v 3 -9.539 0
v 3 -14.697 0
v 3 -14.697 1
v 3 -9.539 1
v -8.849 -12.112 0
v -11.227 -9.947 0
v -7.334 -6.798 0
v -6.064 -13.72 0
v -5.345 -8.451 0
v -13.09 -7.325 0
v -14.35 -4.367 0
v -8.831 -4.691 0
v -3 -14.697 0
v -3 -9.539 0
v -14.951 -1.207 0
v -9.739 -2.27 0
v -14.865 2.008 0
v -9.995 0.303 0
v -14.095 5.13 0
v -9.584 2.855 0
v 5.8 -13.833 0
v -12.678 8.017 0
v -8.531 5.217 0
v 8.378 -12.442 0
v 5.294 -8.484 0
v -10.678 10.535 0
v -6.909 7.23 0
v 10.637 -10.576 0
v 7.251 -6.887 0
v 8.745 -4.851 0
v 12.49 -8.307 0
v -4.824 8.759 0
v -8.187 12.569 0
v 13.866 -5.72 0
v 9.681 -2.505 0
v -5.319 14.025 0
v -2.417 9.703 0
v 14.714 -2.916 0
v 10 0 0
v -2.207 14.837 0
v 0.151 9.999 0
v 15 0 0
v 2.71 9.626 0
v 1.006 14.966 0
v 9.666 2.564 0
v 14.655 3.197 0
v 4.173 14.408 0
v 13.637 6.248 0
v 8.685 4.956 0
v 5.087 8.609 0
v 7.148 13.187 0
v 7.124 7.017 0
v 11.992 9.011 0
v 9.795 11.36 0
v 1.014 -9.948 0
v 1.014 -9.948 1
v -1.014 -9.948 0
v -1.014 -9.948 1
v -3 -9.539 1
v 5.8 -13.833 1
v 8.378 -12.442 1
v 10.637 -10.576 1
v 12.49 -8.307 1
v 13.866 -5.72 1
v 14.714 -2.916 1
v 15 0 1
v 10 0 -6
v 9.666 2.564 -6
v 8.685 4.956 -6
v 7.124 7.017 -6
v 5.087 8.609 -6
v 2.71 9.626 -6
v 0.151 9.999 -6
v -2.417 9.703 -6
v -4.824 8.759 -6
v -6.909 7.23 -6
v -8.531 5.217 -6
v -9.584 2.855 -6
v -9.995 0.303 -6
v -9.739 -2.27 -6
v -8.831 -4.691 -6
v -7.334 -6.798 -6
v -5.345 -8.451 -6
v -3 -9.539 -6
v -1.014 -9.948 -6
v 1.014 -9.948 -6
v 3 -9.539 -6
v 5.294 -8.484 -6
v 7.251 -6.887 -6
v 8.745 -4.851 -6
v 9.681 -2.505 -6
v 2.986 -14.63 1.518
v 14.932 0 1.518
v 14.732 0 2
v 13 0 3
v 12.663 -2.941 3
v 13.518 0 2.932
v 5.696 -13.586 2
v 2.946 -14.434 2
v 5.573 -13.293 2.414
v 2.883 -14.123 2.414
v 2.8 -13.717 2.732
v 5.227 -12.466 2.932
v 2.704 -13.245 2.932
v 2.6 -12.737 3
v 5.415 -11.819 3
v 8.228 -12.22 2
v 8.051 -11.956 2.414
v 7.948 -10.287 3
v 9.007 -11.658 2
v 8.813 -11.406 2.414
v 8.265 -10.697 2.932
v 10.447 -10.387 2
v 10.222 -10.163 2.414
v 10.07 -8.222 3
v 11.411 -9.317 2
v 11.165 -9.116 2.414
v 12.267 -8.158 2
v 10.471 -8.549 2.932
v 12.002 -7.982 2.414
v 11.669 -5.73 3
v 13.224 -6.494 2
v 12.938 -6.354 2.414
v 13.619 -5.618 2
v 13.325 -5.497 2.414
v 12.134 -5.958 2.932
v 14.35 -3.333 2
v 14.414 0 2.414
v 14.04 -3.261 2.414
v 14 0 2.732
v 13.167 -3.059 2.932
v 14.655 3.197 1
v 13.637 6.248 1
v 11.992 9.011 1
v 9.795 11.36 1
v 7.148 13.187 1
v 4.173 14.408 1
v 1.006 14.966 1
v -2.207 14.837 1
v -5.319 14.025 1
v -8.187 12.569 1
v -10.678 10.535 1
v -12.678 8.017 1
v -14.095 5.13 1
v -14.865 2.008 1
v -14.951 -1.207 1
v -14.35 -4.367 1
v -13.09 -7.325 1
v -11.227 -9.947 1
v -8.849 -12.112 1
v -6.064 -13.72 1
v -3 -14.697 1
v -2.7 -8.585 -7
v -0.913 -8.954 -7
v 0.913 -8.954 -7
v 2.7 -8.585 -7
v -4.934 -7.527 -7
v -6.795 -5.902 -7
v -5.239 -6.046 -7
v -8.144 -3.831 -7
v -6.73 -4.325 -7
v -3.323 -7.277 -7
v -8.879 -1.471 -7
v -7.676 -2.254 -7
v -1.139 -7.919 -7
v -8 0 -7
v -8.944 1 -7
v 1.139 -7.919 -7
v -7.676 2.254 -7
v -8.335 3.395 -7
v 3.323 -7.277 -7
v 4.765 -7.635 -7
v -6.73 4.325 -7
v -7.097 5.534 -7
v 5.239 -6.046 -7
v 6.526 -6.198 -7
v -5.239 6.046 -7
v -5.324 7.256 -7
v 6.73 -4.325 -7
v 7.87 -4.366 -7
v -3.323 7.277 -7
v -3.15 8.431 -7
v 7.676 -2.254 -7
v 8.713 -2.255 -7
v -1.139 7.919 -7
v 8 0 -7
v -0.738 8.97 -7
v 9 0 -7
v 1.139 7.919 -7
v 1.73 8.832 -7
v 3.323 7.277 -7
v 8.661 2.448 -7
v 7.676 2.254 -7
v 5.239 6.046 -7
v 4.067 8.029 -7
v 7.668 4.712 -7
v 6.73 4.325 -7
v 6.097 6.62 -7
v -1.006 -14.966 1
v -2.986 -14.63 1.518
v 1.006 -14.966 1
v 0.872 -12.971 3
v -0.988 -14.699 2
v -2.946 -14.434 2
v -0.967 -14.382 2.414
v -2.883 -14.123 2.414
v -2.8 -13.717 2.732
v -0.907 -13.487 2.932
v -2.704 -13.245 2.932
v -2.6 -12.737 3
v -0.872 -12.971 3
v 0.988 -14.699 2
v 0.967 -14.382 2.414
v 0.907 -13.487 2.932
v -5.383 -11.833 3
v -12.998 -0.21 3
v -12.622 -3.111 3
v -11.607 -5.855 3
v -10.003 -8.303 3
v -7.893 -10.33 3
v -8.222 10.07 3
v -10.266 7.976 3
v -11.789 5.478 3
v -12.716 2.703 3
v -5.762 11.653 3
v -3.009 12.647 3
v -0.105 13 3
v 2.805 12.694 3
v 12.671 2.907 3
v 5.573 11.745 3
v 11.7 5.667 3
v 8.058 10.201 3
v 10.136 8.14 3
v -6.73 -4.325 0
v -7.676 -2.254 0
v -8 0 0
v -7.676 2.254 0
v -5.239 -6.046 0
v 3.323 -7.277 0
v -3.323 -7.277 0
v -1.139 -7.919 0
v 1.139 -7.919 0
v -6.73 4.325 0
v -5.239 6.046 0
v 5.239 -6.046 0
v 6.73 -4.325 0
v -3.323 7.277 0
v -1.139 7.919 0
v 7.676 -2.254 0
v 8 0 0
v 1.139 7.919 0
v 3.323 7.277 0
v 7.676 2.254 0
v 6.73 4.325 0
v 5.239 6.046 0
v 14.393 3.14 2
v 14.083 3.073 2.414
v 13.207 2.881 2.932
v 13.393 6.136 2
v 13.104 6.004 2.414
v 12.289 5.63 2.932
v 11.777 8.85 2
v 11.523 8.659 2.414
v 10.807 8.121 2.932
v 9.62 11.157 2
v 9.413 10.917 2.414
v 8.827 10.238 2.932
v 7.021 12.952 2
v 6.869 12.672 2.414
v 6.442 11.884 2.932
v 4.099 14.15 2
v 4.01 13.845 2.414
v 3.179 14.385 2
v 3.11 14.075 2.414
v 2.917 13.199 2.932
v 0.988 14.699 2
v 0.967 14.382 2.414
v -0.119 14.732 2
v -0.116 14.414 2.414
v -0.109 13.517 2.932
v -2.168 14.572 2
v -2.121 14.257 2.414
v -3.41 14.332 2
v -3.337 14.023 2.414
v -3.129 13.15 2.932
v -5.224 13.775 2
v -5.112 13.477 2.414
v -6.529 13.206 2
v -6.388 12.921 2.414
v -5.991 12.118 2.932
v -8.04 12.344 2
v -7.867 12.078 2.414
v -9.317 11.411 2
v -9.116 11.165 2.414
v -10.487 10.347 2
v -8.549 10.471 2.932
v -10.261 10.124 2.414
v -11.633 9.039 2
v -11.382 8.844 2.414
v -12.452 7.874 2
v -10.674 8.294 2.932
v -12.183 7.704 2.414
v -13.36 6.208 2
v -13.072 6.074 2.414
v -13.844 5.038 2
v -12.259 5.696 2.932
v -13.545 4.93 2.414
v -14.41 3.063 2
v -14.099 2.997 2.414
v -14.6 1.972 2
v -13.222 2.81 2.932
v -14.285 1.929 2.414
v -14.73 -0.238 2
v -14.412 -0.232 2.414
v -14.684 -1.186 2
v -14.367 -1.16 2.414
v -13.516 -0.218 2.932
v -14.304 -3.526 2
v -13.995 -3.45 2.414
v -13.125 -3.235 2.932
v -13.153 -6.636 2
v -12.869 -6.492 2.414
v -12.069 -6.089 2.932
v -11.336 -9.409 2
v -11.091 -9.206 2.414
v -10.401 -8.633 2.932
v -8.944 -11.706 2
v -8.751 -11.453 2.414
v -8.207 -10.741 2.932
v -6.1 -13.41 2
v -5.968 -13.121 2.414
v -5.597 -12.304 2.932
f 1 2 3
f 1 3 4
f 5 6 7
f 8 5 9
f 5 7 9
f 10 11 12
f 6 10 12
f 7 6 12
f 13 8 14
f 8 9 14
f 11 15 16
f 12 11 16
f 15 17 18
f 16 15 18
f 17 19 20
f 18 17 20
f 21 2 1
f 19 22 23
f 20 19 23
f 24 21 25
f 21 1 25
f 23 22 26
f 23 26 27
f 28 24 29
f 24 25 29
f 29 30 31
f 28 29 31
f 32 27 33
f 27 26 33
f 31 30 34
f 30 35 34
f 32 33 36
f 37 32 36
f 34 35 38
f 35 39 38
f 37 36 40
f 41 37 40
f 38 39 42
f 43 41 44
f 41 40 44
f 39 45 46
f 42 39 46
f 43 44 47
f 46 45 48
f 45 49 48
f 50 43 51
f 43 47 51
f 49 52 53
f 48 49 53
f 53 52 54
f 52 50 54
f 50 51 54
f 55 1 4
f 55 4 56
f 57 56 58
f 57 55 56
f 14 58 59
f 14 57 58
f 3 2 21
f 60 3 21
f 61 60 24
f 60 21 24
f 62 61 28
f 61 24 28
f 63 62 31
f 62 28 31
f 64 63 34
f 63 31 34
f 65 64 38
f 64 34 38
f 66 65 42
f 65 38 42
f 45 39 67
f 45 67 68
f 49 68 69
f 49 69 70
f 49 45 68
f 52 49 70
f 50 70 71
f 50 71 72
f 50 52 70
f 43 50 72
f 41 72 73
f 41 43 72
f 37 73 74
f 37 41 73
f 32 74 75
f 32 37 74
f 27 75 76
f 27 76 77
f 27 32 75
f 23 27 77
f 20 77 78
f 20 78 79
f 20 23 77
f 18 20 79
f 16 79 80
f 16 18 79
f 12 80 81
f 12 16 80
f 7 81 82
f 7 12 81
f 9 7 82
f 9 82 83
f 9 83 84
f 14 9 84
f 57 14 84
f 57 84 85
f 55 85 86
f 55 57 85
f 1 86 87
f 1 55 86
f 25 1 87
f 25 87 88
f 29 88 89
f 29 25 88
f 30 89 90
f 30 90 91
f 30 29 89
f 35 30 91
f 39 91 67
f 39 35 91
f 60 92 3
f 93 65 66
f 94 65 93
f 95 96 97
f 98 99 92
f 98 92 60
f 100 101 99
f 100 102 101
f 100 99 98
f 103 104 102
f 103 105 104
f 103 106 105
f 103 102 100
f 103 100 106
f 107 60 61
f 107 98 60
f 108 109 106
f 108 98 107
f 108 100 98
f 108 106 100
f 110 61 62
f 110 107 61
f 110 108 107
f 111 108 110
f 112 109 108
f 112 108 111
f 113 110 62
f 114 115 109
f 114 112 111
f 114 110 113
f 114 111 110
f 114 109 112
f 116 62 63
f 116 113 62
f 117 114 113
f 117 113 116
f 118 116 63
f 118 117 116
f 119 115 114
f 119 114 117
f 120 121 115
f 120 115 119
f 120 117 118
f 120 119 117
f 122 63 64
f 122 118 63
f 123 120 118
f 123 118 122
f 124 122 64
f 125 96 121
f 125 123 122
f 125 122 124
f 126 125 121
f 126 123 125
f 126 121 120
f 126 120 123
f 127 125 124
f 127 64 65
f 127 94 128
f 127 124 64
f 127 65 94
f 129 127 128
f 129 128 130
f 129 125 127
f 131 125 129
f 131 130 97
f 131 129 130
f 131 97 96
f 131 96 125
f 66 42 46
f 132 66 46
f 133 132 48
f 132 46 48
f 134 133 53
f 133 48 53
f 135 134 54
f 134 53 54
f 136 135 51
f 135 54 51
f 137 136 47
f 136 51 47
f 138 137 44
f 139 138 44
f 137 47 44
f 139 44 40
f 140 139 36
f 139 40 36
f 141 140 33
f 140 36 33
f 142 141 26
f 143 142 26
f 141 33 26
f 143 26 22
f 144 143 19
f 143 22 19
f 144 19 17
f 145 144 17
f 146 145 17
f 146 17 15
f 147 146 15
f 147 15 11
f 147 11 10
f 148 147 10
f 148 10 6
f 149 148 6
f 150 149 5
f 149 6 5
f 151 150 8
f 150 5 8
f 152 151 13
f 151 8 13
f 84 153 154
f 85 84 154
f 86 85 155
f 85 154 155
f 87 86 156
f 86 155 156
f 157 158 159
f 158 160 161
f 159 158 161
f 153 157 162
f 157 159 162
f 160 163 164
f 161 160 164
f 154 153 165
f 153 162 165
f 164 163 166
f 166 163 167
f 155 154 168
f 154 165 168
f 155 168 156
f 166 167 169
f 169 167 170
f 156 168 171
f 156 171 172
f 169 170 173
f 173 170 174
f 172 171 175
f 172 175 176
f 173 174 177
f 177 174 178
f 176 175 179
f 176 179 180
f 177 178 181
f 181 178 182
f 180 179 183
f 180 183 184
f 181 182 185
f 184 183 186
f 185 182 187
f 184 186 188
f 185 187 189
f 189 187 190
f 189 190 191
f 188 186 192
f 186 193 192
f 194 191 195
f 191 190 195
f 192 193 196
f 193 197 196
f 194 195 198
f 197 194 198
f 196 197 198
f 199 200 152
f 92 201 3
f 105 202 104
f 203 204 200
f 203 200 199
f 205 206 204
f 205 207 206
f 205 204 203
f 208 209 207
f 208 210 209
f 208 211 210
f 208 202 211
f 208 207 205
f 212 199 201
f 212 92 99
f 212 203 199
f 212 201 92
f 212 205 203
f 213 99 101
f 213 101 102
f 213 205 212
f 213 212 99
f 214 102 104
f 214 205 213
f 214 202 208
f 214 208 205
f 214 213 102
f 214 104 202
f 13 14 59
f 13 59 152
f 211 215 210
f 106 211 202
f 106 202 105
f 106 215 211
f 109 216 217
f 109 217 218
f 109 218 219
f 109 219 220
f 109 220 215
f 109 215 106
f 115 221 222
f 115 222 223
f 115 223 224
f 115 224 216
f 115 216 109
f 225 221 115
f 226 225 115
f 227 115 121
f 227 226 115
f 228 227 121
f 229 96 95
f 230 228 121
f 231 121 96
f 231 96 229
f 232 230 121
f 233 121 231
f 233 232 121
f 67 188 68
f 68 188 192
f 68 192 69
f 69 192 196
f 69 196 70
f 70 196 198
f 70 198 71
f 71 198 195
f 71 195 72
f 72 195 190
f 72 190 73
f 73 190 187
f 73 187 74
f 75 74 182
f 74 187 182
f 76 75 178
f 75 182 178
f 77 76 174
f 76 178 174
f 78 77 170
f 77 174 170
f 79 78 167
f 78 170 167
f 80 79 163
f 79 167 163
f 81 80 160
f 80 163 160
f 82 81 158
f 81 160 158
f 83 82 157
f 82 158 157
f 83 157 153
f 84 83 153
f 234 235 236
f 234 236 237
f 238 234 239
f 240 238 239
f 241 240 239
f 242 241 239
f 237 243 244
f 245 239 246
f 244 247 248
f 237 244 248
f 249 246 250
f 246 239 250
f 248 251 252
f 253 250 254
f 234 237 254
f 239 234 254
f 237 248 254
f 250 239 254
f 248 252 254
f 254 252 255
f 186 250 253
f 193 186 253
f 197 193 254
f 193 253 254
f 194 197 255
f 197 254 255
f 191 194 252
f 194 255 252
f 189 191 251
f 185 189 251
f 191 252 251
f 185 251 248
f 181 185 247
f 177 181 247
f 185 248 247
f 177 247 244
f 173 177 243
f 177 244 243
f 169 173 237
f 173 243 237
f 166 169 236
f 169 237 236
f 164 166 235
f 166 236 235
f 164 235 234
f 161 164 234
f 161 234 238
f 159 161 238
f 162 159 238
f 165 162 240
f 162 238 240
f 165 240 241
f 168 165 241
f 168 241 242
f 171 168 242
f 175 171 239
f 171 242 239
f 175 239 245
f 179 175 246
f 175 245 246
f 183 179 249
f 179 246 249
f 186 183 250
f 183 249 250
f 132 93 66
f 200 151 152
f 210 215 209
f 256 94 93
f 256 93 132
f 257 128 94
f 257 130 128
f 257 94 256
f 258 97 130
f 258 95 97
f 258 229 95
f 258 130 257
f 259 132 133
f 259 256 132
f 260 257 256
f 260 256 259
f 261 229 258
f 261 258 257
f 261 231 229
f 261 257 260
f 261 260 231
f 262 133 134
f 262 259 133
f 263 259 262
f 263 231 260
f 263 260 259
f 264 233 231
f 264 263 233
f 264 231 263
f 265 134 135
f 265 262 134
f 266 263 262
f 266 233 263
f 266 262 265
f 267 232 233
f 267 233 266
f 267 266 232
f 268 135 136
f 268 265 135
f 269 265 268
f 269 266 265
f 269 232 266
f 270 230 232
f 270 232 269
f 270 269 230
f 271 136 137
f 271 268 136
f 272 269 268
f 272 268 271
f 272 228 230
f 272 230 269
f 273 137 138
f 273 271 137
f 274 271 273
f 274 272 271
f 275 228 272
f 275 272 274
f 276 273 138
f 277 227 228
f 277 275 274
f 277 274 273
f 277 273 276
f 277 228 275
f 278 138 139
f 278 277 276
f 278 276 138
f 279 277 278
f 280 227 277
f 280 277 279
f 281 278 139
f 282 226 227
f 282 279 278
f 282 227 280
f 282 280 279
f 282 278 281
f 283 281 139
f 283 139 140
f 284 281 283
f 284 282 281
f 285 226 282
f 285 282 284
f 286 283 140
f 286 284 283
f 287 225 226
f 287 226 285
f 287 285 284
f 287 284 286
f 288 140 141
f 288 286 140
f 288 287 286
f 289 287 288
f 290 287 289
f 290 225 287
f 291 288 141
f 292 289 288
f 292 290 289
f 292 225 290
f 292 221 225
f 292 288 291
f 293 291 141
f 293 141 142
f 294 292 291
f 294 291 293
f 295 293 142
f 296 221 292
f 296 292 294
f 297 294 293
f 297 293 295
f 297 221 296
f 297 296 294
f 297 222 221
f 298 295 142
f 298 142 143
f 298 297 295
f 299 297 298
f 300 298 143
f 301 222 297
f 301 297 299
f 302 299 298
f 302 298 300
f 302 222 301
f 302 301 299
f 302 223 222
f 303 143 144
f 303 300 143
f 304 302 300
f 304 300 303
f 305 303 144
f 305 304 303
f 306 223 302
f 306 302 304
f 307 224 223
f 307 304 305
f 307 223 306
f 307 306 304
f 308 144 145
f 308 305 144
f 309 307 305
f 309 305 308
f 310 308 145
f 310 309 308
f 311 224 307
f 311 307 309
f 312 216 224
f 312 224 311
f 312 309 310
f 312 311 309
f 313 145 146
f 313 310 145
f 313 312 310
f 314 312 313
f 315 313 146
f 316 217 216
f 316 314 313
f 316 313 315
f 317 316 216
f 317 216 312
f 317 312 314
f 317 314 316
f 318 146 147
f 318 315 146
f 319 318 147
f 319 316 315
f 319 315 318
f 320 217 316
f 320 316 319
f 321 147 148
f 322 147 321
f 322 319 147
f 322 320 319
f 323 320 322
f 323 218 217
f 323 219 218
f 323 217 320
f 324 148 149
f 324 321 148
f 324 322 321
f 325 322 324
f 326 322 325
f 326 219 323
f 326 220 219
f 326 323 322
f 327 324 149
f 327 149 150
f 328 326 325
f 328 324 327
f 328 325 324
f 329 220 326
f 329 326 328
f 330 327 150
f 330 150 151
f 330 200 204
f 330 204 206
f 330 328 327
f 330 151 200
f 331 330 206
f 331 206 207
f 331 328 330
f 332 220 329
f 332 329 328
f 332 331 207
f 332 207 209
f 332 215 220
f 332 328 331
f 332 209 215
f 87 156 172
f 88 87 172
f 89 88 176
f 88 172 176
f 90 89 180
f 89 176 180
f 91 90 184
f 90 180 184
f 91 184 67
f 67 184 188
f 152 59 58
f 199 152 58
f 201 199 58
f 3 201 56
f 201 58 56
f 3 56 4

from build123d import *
from build123d import SkipClean  # not in build123d's __all__

# Parameters (mm, degrees)
F0_R     = 8
F1_DEPTH = 3
F2_DEPTH = 7
F3_R     = 2
F4_SIZE  = 1
F5_DEPTH = 1


with BuildPart() as f1:
    # F0 (on Top) → F1 (new body)
    with BuildSketch(Plane.XY):
        with BuildLine():
            ThreePointArc((-3, -9.5393920142), (-5.9160797831, 8.0622577483), (10, 0))
            ThreePointArc((10, 0), (8.0622577483, -5.9160797831), (3, -9.5393920142))
            Line((3, -9.5393920142), (3, -14.6969384567))
            ThreePointArc((3, -14.6969384567), (11.6189500386, -9.4868329805), (15, 0))
            ThreePointArc((15, 0), (-9.4868329805, 11.6189500386), (-3, -14.6969384567))
            Line((-3, -14.6969384567), (-3, -9.5393920142))
        make_face()
        with BuildLine():
            ThreePointArc((3, -9.5393920142), (0, -10), (-3, -9.5393920142))
            Line((-3, -9.5393920142), (-3, -14.6969384567))
            ThreePointArc((-3, -14.6969384567), (0, -15), (3, -14.6969384567))
            Line((3, -14.6969384567), (3, -9.5393920142))
        make_face()
        with BuildLine():
            ThreePointArc((3, -9.5393920142), (8.0622577483, -5.9160797831), (10, 0))
            ThreePointArc((10, 0), (-5.9160797831, 8.0622577483), (-3, -9.5393920142))
            ThreePointArc((-3, -9.5393920142), (0, -10), (3, -9.5393920142))
        make_face()
        Circle(F0_R, mode=Mode.SUBTRACT)
        Circle(F0_R)
    extrude(amount=F1_DEPTH)

    # F0 (on Top) → F2 (join)
    with BuildSketch(Plane.XY):
        with BuildLine():
            ThreePointArc((3, -9.5393920142), (8.0622577483, -5.9160797831), (10, 0))
            ThreePointArc((10, 0), (-5.9160797831, 8.0622577483), (-3, -9.5393920142))
            ThreePointArc((-3, -9.5393920142), (0, -10), (3, -9.5393920142))
        make_face()
        Circle(F0_R, mode=Mode.SUBTRACT)
    extrude(amount=-F2_DEPTH)

    # F3
    f3_edges = [f1.edges().sort_by_distance(p)[0] for p in [
        (-15, 0, 3),
    ]]
    fillet(f3_edges, radius=F3_R)

    # F4
    f4_edges = [f1.edges().sort_by_distance(p)[0] for p in [
        (3, 9.539392, -7),
    ]]
    chamfer(f4_edges, length=F4_SIZE)

    # F0 (on Top) → F5 (cut)
    with BuildSketch(Plane.XY):
        with BuildLine():
            ThreePointArc((3, -9.5393920142), (0, -10), (-3, -9.5393920142))
            Line((-3, -9.5393920142), (-3, -14.6969384567))
            ThreePointArc((-3, -14.6969384567), (0, -15), (3, -14.6969384567))
            Line((3, -14.6969384567), (3, -9.5393920142))
        make_face()
    with SkipClean():  # cleaning this boolean's faces spoils the solid; the shape is the same uncleaned
        extrude(amount=F5_DEPTH, mode=Mode.SUBTRACT)


solid = f1.part
